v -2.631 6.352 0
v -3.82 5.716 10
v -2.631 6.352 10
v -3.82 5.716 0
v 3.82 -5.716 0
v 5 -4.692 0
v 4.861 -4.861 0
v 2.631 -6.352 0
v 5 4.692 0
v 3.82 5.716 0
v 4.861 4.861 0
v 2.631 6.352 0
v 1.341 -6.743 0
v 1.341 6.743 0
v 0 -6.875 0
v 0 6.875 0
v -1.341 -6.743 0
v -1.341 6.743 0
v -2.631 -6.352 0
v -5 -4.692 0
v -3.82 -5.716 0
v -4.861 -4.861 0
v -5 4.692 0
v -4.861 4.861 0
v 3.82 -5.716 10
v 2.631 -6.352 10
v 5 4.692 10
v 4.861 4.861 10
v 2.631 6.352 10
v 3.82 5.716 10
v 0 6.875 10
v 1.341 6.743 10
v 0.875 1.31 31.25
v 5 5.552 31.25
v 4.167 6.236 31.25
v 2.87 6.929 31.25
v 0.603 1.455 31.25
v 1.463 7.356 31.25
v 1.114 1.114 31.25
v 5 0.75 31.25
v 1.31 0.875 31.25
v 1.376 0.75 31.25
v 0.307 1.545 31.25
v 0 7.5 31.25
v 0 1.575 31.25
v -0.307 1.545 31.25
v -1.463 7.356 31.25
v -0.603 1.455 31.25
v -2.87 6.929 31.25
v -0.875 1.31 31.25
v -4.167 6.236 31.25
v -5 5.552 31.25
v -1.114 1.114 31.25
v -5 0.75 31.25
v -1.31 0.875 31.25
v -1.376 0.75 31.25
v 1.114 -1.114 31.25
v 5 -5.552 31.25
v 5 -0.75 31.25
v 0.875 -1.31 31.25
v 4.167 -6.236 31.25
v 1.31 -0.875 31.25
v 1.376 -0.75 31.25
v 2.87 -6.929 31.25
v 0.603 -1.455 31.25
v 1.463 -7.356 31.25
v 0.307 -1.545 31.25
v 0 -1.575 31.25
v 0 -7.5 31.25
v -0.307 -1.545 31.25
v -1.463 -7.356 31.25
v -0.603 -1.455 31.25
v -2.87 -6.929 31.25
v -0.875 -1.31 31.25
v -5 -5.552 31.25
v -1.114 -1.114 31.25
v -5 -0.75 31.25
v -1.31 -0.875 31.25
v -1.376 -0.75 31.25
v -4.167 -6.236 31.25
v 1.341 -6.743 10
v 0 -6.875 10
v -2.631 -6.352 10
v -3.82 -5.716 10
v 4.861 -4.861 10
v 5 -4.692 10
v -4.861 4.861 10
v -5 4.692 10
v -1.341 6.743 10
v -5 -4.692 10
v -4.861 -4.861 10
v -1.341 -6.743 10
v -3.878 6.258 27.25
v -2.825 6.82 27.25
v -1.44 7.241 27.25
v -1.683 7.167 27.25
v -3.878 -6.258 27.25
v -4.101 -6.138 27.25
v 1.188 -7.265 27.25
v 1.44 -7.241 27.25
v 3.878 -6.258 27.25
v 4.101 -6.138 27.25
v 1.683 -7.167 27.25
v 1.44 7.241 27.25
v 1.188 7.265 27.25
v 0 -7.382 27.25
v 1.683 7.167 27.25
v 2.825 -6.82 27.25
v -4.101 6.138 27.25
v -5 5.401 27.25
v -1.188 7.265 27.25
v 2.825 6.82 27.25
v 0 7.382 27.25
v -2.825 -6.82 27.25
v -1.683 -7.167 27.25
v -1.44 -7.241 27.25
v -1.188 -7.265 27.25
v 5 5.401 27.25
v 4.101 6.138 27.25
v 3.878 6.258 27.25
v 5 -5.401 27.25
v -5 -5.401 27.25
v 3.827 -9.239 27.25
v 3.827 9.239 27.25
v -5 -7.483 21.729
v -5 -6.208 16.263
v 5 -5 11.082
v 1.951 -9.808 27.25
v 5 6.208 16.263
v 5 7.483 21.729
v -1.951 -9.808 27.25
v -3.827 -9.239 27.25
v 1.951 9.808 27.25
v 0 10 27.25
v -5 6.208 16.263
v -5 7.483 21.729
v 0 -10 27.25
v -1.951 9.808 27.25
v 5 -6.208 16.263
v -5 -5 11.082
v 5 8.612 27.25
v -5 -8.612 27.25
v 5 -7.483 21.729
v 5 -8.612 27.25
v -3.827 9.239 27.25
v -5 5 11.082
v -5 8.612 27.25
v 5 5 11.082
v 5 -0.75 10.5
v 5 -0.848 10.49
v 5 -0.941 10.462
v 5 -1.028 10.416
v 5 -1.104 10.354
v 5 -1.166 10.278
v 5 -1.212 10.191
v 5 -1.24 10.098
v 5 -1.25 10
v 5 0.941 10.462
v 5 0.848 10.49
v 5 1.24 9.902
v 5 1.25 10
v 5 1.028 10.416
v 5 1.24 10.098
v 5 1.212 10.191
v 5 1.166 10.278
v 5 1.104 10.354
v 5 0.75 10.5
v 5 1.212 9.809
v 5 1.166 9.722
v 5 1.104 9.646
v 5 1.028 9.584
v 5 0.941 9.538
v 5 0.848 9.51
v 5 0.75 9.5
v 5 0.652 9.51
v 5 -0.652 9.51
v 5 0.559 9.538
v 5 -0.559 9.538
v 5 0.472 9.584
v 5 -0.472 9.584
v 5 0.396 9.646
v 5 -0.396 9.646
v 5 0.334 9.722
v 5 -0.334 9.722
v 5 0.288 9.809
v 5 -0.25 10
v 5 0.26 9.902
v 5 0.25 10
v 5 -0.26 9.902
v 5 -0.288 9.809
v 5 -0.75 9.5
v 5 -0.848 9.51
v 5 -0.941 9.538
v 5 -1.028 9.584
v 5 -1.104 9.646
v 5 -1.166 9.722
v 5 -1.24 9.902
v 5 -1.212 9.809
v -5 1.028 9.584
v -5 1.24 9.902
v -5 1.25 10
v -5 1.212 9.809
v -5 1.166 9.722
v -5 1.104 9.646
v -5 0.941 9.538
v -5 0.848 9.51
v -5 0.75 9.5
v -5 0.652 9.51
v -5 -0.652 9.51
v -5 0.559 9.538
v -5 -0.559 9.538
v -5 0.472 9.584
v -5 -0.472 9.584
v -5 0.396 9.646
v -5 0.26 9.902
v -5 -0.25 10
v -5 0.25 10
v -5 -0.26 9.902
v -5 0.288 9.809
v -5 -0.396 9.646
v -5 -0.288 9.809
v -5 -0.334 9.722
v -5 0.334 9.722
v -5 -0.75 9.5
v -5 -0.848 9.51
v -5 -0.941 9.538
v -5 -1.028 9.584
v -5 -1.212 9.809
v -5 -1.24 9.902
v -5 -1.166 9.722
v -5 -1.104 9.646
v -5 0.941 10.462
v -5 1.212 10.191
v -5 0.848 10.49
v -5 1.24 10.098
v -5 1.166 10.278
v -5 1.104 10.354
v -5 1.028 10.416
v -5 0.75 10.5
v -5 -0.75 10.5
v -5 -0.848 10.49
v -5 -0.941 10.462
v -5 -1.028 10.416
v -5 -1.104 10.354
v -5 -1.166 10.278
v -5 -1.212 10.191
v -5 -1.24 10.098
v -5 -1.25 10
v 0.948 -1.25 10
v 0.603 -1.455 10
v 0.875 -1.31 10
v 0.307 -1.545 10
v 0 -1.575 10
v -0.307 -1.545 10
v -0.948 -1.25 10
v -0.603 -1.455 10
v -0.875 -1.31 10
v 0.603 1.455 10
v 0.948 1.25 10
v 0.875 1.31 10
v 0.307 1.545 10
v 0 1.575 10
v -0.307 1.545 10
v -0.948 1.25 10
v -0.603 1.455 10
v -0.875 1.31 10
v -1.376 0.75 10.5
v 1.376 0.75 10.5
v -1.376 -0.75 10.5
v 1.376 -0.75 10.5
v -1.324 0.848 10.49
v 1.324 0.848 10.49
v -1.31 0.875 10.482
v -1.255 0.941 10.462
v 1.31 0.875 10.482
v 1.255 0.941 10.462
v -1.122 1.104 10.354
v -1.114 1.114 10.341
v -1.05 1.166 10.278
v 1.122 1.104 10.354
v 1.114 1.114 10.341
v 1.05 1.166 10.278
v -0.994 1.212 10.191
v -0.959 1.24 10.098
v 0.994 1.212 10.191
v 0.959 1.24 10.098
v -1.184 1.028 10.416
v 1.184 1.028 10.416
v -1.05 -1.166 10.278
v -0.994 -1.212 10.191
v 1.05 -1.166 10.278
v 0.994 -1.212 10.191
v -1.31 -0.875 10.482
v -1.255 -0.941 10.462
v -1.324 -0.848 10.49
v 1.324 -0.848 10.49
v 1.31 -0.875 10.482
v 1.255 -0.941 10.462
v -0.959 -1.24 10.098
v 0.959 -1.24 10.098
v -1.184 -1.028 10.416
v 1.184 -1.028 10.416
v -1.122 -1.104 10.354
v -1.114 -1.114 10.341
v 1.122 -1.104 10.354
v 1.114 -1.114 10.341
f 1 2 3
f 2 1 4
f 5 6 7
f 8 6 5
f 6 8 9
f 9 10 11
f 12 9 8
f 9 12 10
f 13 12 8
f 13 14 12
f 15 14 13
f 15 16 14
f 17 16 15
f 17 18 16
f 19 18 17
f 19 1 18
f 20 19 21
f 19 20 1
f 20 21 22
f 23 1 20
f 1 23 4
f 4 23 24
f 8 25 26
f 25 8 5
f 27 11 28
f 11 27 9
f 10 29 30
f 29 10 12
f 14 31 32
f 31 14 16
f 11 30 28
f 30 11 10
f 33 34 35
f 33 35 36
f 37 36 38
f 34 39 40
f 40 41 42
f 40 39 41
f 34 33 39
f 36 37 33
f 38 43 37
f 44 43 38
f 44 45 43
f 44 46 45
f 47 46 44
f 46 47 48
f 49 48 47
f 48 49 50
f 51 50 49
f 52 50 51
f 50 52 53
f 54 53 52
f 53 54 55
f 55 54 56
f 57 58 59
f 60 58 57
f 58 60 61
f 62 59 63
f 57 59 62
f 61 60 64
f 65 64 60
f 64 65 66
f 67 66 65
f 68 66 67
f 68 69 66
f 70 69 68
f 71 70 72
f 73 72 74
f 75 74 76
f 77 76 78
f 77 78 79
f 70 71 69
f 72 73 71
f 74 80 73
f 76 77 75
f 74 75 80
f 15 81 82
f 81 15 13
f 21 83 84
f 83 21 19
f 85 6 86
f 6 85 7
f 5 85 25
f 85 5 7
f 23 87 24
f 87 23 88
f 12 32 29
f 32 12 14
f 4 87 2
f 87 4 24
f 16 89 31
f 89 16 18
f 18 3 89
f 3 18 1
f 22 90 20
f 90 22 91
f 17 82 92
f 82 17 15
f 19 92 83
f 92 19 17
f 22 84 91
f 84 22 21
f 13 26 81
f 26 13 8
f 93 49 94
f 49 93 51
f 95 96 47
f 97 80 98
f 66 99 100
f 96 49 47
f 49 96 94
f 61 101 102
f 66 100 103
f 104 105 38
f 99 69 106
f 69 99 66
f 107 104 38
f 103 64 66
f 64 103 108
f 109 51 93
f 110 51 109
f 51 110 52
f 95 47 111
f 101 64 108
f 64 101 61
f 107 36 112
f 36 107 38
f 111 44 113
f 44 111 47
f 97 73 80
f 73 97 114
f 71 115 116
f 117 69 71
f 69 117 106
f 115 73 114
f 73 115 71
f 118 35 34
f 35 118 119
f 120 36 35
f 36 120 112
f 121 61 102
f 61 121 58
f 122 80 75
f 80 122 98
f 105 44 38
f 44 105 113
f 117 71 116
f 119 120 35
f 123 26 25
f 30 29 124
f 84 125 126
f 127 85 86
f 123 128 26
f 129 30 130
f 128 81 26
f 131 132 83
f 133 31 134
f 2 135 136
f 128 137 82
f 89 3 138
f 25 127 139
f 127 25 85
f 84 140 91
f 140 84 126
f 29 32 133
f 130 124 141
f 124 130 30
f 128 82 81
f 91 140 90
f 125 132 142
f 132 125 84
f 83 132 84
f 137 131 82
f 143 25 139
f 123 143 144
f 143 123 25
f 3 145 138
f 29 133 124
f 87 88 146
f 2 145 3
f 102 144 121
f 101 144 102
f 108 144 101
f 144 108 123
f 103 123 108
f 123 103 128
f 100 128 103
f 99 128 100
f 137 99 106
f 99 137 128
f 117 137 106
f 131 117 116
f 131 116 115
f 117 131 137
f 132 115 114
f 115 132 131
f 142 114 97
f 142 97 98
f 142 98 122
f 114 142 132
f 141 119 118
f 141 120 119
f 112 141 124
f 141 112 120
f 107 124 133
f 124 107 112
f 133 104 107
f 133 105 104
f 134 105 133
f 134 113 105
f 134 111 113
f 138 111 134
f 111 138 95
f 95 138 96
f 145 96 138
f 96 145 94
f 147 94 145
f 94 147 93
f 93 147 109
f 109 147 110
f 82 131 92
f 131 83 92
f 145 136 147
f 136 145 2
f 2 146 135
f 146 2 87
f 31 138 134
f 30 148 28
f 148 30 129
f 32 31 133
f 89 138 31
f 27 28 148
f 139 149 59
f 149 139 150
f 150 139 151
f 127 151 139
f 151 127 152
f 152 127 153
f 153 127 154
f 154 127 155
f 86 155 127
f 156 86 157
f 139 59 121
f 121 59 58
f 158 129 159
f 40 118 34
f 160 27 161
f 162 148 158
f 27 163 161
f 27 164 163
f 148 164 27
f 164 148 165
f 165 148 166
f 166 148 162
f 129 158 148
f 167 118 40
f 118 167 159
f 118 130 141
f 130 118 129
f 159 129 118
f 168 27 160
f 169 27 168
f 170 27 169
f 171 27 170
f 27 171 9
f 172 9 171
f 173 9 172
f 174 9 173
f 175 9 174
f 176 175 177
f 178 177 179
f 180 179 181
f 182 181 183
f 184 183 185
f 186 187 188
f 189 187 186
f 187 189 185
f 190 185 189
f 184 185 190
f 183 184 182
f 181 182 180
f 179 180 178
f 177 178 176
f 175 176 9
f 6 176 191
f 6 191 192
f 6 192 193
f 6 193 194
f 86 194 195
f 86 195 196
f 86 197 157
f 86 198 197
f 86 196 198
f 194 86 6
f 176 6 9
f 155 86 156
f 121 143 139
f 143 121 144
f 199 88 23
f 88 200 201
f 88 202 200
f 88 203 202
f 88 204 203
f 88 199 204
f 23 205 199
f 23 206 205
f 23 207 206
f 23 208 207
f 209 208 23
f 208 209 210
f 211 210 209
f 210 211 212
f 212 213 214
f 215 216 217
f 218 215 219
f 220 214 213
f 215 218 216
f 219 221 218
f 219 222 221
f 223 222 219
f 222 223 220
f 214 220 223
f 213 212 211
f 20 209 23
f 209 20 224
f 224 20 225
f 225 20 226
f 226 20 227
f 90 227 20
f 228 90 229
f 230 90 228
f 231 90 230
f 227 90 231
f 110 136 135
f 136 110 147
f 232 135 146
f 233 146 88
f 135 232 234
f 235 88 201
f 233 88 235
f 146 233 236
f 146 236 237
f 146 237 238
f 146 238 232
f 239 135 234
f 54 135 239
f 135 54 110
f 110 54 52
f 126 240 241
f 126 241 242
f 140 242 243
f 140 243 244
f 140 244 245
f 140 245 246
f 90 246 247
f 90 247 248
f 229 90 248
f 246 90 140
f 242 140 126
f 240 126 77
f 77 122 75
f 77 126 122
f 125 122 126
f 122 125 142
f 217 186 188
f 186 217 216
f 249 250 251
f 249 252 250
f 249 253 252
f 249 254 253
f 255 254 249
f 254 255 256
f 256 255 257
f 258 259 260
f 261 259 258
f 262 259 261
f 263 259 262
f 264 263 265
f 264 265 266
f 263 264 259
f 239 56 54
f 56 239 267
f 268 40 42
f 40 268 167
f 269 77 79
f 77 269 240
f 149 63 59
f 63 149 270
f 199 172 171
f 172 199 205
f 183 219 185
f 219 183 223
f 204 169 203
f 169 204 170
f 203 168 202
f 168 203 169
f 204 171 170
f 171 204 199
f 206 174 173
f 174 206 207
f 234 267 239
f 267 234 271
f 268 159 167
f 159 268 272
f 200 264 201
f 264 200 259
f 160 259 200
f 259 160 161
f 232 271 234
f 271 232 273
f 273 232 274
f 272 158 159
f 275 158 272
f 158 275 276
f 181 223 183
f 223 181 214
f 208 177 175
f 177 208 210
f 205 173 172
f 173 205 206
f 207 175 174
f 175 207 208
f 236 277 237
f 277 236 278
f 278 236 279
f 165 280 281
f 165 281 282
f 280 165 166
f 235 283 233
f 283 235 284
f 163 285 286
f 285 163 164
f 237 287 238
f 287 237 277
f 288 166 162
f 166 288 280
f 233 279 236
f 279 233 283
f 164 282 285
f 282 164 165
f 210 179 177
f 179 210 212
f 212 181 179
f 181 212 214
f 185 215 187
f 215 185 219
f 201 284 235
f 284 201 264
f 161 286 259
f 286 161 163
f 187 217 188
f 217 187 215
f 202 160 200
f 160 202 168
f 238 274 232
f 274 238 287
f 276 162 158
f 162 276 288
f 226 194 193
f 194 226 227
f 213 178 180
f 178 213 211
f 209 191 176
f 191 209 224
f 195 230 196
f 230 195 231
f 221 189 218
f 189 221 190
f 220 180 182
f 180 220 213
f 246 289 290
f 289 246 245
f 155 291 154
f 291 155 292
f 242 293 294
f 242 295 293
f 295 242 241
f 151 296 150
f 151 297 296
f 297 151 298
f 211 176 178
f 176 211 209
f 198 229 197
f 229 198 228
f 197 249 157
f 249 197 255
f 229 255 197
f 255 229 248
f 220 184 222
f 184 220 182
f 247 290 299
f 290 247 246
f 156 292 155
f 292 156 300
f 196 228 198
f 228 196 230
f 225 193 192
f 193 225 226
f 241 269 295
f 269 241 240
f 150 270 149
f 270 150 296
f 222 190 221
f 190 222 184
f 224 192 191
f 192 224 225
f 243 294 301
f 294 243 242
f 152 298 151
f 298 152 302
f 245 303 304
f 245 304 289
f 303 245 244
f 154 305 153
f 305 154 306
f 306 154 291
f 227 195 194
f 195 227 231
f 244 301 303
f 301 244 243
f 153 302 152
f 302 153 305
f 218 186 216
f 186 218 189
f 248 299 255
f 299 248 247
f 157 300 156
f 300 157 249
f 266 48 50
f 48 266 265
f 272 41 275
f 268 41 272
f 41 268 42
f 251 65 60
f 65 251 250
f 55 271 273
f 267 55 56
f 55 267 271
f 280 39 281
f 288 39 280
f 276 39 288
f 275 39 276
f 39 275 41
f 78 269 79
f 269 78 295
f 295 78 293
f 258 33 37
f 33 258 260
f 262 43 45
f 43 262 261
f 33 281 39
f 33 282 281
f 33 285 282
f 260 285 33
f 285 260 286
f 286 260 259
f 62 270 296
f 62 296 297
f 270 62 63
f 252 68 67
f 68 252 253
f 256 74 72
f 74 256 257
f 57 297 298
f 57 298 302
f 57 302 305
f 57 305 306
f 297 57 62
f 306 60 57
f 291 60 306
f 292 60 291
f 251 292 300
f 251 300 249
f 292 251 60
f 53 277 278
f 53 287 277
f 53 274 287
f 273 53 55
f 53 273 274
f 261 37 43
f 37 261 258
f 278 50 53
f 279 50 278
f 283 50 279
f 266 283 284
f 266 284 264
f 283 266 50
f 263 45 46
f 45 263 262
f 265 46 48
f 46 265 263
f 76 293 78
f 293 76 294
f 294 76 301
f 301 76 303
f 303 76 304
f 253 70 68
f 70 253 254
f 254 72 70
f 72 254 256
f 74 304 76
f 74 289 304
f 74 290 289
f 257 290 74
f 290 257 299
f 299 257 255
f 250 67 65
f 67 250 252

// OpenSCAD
/*
 * collets4tapHolder.scad
 * 
 * Written by aubenc @ Thingiverse
 *
 * http://www.thingiverse.com/thing:16956
 *
 * This script is licensed under the
 * Attribution - Share Alike license
 *
 * This is a derivative work of "Tap holder" by Rasle500
 *
 *		http://www.thingiverse.com/thing:16682
 *
 * ...and the derivatives of that work:
 *
 *		http://www.thingiverse.com/thing:16839
 *		http://www.thingiverse.com/thing:16890
 *
 * Usage:
 *
 *    Set the parameters for the desired output, run the required module(s),
 *		render to check, compile and export to STL when/if satisfied.
 *
 */


/* *************** Parameters *********************************************** */
// "C" - Cylindrical, Drill Bit / "H" - Hex, Accessoire
typ="C";		

// Parameters for type "C"
// Drill Bit Diameter
dbd=3;

// Parameters for type "H"
// Distance between opposite faces (Hex only)
f2f=6.25;
// Faces number, should NOT work for any value but 6 (Hex only)
ffn=6;
// opening at... "V" - Vertex / "F" - Face (Hex only)
fop="V";
// Side length of the cube used to exagerate the cut for the vertex (Hex only)
fvs=0.5;

// Common Parameters
// ...gap ...tolerance ... ... ...
gap=0.15;
// Minimum size to keep it open (avoid the walls fusing together)
omn=0.5;

// higher values -> smoother circles (high values dont work with customizer though!)
$fn=32;

/* *************** Modules ************************************************** */

 collet(typ); 


/* *************** Code ***************************************************** */

module collet(typ)
{
	difference()
	{
        if( fop == "V" )
        {
            body();
        }
        else if( fop == "F" )
        {
            rotate([0,0,360/ffn/2]) body();
        }
        
        if( fop == "V" )
        {
            opening();
        }
        else if ( fop == "F" )
        {
            rotate([0,0,360/ffn/2]) opening();
        }
		

		if( typ == "C" )
		{
			drill_bit();
		}
		else if( typ == "H" )
		{
            accessoire_bit();
		}
	}
}

module body()
{
    difference()
	{
        union()
        {
            cylinder(h=31.25, r=13.75/2, center=false);

            translate([0,0,10])
            cylinder(h=31.25-10, r1=13.75/2, r2=15/2, center=false);

            translate([0,0,10])
            cylinder(h=31.25-10-4, r1=13.75/2, r2=20/2, center=false);
        };
        translate([8,0,15.9])
        cube(size=[6,18,32], center=true);
        translate([-8,0,15.9])
        cube(size=[6,18,32], center=true);
    }
}

module drill_bit()
{
    translate([0,0,10])
    cylinder(h=31.25-7+0.2, r=(dbd+gap)/2, center=false);
}

module opening()
{
    ono=2;
	oy=dbd/ono > omn ? dbd/ono : omn;

	translate([0,0,10])
	for(i=[0:ono-1])
	{
		rotate([0,0,i*360/ono])
		translate([6,0,31.25/2])
		cube(size=[12,oy,31.25], center=true);
	}
    
    // little cylinders at bottom of opening for better bending
    translate([0,oy/2,10])
    rotate([0,90,0])
    cylinder(h=11, r=0.5, center=true);
    
    translate([0,-oy/2,10])
    rotate([0,90,0])
    cylinder(h=11, r=0.5, center=true);
}

module accessoire_bit()
{
	lf=360/ffn;
	fod=f2f/sin(lf);

	union()
	{
		translate([0,0,10])
		cylinder(h=31.25+0.2, r=(fod+gap)/2, $fn=ffn, center=false);
		
		if( fvs != 0 )
		{
            xd=(fod+gap+fvs)/2-(fvs*cos(lf)/2/sin(lf))-0.05;
			for(i=[0:ffn-1])
			{
                x=xd*cos(i*lf);
                y=xd*sin(i*lf);
				translate([x,y,10+(31.25/2)])
				rotate([0,0,i*lf])
				cube([fvs,fvs,31.25], center=true);
			}
		}
	}
}
